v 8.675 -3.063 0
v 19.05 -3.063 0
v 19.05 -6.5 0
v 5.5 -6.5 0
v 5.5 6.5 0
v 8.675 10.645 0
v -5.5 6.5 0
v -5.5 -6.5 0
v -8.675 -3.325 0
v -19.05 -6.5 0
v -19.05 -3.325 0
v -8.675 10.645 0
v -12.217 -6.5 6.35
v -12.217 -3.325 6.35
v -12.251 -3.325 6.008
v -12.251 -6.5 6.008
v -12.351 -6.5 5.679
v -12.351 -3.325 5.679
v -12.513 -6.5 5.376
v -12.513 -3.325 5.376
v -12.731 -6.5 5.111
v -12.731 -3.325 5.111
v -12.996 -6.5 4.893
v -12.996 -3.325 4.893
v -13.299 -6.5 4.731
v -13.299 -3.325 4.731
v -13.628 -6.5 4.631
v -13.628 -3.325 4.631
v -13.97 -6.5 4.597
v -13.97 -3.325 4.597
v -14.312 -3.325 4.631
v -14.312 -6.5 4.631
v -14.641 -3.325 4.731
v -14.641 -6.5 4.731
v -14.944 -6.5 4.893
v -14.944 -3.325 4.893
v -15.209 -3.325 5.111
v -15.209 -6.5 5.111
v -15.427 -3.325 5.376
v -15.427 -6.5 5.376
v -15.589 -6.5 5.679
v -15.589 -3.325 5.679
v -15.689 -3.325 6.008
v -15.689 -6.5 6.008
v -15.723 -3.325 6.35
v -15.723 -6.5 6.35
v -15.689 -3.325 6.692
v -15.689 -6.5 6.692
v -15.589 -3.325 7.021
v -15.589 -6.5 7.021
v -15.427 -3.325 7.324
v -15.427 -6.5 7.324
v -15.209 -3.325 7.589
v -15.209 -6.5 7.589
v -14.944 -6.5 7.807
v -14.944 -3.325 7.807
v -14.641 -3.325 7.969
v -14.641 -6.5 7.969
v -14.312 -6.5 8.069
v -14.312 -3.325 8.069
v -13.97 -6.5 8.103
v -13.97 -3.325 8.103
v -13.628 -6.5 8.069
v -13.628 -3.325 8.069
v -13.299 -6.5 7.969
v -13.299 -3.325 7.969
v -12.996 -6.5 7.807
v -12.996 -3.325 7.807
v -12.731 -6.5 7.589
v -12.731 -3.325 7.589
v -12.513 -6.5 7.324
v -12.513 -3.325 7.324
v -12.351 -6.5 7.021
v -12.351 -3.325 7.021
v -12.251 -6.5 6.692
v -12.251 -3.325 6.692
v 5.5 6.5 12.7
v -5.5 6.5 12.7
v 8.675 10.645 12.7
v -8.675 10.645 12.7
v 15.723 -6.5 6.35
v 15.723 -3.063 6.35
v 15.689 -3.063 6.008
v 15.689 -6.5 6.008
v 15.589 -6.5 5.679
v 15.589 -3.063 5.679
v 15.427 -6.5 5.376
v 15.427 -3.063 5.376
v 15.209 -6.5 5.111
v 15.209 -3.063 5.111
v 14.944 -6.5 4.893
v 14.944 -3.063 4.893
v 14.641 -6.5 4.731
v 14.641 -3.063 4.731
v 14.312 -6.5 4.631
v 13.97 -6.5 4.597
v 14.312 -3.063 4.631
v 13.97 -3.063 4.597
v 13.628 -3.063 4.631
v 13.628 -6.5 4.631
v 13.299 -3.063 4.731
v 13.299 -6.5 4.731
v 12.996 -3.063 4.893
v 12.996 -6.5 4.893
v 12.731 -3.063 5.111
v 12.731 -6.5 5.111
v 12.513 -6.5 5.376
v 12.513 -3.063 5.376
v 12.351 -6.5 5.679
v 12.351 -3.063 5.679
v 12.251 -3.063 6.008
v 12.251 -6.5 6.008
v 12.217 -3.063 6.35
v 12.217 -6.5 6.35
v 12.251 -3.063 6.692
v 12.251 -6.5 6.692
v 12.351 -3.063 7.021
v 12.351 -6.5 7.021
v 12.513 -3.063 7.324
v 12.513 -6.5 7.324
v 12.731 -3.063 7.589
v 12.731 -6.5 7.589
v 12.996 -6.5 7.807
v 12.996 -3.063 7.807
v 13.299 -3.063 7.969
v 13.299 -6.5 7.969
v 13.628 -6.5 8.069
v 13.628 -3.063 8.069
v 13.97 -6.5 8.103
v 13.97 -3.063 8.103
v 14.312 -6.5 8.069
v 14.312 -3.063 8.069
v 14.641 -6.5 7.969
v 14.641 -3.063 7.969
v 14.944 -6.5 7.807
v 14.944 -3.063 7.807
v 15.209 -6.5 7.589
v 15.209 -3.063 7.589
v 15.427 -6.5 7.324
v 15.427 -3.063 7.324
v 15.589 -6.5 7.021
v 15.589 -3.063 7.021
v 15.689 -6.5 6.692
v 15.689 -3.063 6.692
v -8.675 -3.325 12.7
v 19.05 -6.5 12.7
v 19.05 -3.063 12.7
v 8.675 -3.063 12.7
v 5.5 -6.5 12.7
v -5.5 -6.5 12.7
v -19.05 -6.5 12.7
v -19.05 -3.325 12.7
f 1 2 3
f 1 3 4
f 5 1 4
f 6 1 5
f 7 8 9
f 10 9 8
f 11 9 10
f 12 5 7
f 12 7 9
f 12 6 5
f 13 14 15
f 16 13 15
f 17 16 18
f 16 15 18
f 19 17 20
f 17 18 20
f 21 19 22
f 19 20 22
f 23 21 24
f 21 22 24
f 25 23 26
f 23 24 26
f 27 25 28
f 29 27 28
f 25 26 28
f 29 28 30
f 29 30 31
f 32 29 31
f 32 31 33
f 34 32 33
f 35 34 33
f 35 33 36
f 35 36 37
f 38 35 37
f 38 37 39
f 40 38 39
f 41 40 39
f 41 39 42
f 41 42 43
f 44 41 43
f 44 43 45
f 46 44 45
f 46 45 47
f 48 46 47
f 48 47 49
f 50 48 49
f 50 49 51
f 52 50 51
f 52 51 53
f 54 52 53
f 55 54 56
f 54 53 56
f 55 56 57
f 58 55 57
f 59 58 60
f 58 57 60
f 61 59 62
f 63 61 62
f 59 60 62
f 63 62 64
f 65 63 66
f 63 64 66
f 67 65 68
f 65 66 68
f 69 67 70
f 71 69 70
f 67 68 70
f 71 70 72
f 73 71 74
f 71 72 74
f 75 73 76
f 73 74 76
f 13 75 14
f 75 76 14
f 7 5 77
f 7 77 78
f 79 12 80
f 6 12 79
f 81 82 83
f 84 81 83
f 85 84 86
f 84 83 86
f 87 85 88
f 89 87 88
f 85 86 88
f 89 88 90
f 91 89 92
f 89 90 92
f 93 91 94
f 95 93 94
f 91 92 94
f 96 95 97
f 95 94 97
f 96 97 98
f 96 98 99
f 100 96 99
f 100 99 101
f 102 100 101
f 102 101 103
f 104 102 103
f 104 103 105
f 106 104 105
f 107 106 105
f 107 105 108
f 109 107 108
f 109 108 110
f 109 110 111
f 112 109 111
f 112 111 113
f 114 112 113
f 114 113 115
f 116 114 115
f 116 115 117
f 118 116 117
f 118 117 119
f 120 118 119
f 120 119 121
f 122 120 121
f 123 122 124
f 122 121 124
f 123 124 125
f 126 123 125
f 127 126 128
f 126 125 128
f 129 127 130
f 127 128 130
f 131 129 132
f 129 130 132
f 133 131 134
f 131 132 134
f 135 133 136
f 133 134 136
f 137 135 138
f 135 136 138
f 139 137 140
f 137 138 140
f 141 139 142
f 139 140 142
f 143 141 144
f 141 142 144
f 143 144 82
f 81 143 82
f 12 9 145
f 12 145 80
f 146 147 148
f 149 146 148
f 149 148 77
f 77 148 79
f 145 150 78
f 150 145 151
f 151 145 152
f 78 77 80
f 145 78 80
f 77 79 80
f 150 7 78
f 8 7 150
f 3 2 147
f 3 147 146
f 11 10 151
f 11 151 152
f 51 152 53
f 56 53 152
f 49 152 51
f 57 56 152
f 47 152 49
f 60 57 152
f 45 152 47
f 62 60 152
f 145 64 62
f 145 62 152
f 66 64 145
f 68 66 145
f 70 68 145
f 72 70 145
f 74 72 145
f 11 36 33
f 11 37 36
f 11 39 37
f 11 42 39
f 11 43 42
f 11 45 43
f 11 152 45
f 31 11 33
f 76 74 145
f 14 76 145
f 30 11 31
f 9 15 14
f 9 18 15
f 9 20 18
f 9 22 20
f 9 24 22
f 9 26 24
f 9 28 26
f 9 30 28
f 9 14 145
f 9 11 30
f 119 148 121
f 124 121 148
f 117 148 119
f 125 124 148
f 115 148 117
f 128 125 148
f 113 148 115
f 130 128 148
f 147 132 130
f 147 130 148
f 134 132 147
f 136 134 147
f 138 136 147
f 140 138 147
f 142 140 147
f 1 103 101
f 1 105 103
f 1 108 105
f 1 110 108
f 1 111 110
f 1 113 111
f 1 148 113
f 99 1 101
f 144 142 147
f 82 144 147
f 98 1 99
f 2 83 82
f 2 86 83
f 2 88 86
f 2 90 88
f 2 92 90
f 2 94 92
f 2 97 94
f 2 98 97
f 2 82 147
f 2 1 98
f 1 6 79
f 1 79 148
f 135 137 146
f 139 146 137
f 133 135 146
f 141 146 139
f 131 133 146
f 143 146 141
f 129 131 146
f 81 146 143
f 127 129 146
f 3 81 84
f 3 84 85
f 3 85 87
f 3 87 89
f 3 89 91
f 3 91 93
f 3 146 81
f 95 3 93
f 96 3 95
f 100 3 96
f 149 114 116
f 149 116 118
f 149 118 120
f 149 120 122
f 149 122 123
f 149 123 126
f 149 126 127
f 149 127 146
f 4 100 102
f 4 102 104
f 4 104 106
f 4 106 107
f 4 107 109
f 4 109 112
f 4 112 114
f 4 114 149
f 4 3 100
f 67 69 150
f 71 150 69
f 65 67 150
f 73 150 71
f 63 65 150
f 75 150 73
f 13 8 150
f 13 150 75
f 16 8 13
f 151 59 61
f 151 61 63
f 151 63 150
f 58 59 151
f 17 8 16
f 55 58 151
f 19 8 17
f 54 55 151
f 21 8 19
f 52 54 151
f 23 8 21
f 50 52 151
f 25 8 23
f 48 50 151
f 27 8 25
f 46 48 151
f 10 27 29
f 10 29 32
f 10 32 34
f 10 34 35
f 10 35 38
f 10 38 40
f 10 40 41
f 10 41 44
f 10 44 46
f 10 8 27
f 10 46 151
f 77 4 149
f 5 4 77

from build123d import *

# Parameters (mm, degrees)
BOSS_EXTRUDE1_DEPTH = 12.7
SKETCH2_R           = 1.7526
CUT_EXTRUDE3_DEPTH  = 4.175
SKETCH3_R           = 1.7526
CUT_EXTRUDE4_DEPTH  = 4.436950898


with BuildPart() as part:
    # Sketch1 → Boss-Extrude1 (new body)
    with BuildSketch(Plane.XY):
        Polygon((-5.5, -6.5), (-19.05, -6.5), (-19.05, -3.325), (-8.675, -3.325), (-8.675, 10.645), (8.675, 10.645), (8.675, -3.063049102), (19.05, -3.063049102), (19.05, -6.5), (5.5, -6.5), (5.5, 6.5), (-5.5, 6.5), align=None)
    extrude(amount=BOSS_EXTRUDE1_DEPTH)

    # Sketch2 → Cut-Extrude3 (cut, through all)
    with BuildSketch(Plane(origin=(0, -3.325, 0), x_dir=(1, 0, 0), z_dir=(0, 1, 0))):
        with Locations((-13.97, -6.35)):
            Circle(SKETCH2_R)
    extrude(amount=-CUT_EXTRUDE3_DEPTH, mode=Mode.SUBTRACT)

    # Sketch3 → Cut-Extrude4 (cut, through all)
    with BuildSketch(Plane(origin=(0, -3.063049102, 0), x_dir=(1, 0, 0), z_dir=(0, 1, 0))):
        with Locations((13.97, -6.35)):
            Circle(SKETCH3_R)
    extrude(amount=-CUT_EXTRUDE4_DEPTH, mode=Mode.SUBTRACT)


solid = part.part
